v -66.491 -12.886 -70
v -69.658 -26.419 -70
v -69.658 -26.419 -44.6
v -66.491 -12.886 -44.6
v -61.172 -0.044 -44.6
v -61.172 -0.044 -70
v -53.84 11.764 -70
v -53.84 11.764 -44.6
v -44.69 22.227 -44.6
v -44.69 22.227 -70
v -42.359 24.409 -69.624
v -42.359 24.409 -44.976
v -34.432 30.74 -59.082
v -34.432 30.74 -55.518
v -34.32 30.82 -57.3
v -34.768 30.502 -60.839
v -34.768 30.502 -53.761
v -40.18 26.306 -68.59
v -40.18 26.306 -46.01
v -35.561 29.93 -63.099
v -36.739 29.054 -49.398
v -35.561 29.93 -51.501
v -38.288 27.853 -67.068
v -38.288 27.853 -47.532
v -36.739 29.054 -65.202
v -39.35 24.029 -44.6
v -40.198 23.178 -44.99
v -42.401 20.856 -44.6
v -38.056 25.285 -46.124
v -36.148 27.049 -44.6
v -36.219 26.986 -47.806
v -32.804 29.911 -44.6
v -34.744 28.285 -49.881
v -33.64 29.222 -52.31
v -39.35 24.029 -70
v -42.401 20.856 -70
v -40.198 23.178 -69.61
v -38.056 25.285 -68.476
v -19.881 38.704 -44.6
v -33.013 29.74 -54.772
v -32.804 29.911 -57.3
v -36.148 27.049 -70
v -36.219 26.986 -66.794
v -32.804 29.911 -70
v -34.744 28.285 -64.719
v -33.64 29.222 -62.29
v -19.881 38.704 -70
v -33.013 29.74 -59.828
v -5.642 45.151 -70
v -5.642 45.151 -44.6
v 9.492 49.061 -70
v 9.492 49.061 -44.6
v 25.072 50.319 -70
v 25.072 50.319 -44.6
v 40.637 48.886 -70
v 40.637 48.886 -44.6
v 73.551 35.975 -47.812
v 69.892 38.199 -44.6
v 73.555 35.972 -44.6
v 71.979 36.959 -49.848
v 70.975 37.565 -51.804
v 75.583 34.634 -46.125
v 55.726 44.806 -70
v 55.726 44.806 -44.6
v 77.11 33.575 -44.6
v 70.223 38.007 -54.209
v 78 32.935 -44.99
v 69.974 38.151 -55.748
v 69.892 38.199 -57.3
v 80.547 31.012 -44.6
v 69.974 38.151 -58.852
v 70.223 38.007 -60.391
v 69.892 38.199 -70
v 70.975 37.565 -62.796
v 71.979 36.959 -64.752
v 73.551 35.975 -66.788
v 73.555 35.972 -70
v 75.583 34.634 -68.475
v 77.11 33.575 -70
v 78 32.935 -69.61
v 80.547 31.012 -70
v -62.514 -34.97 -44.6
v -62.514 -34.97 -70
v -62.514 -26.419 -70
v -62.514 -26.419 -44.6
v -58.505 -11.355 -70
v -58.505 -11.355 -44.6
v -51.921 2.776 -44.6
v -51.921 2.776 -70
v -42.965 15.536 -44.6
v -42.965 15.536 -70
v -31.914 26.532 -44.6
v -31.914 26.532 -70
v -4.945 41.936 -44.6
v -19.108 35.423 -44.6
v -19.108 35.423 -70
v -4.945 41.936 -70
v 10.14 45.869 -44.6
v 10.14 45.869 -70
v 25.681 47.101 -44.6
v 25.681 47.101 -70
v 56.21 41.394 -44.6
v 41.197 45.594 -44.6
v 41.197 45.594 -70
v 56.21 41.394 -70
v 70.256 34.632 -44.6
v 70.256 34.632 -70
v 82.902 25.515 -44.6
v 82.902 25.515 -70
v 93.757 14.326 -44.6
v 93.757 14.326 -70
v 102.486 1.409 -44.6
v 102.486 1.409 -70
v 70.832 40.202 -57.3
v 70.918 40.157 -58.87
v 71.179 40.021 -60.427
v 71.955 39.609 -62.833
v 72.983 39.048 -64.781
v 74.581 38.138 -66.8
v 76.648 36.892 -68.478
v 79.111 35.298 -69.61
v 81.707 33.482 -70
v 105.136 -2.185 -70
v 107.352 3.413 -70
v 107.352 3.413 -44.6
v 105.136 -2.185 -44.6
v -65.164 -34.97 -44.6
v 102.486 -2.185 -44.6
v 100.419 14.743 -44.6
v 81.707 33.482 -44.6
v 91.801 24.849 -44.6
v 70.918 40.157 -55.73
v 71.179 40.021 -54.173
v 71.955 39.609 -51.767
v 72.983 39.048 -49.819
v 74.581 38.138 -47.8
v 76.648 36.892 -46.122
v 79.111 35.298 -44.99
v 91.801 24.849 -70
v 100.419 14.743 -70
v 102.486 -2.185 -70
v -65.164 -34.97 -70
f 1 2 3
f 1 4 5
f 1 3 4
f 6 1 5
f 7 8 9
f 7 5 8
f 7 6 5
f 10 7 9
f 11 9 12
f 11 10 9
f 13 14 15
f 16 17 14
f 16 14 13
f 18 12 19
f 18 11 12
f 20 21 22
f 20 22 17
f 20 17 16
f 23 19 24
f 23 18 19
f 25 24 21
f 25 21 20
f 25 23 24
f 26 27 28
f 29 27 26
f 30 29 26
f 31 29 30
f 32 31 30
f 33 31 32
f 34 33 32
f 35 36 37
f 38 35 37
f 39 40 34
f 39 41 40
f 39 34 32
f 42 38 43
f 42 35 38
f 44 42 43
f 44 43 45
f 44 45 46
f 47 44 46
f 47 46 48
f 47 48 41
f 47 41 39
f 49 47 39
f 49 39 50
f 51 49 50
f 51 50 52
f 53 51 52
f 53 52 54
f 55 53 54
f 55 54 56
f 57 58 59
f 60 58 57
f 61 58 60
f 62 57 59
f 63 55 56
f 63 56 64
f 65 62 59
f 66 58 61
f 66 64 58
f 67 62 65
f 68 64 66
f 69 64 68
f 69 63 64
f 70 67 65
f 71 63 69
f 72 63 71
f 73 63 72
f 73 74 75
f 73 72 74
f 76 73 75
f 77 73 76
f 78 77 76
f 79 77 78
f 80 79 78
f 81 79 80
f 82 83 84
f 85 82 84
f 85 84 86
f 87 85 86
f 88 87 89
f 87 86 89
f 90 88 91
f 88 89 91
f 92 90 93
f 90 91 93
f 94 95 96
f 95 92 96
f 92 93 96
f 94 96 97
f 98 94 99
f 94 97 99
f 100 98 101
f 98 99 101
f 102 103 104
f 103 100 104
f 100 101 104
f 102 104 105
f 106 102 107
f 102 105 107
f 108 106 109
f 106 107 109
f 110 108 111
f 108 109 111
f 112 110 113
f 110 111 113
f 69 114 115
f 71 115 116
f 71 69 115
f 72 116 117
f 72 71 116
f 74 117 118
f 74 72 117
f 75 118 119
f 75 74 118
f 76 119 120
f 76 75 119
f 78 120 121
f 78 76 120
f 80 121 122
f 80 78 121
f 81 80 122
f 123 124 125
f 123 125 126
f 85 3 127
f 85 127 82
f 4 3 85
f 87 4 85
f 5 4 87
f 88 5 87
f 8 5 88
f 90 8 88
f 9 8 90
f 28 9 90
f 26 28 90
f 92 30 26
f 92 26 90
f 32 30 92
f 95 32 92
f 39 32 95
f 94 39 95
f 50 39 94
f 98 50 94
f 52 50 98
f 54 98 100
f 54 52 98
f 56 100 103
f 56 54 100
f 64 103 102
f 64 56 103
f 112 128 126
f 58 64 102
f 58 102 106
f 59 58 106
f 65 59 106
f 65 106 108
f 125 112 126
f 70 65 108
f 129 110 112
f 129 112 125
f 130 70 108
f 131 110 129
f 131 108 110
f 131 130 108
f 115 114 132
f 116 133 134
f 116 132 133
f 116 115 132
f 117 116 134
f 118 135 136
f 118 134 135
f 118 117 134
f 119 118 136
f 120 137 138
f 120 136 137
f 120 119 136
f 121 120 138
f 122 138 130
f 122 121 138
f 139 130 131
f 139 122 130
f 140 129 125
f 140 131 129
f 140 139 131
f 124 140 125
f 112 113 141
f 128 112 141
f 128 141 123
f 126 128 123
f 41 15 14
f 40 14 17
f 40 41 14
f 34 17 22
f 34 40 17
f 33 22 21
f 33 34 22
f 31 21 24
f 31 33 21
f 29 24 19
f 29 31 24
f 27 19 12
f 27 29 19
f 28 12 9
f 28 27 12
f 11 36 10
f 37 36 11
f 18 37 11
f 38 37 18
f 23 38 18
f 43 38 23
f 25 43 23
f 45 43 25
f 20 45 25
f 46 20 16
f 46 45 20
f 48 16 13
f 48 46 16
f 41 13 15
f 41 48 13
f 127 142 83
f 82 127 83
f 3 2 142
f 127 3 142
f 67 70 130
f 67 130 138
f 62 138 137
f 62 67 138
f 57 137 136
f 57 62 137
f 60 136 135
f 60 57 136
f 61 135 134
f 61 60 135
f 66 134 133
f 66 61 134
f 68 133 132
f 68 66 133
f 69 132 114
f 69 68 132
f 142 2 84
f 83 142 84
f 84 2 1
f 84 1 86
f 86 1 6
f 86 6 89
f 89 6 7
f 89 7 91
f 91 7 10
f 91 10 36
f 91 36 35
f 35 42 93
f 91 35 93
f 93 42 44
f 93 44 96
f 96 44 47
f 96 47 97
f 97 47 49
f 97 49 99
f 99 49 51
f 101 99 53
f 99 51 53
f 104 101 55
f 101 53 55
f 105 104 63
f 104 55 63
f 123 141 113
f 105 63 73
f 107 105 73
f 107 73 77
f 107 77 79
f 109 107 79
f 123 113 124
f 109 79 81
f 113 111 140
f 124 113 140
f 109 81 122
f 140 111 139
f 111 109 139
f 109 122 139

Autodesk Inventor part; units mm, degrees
ref_plane "YZ Plane" through (0, 0, 0) normal (1, 0, 0) x (0, 1, 0)
ref_plane "XZ Plane" through (0, 0, 0) normal (0, 1, 0) x (-1, 0, 0)
ref_plane "Work Plane1" through (0, 0, -70) normal (0, 0, 1) x (1, 0, 0)
sketch "Sketch1" plane through (0, 0, -70) normal (0, 0, 1) x (1, 0, 0)
  line L0 (105.135585, -0.094334) -> (105.135585, -23.278359)
  line L1 (-62.514415, -50.241251) -> (-62.514415, -27.759659)
  line L2 (-62.514415, -26.419466) -> (-62.514415, -51.782245)
  line L3 (102.485585, -0.094334) -> (102.485585, -23.278359)
  line L4 (102.485585, 1.408956) -> (105.135585, 1.408956)
  line L5 (-62.514415, -26.419466) -> (-62.514415, -51.782245)
  line L6 (-65.164415, -50.241251) -> (-65.164415, -27.759659)
  line L7 (-62.514415, -26.419466) -> (-65.164415, -26.419466)
  arc A0 (105.135585, 1.408956) -> (-65.164415, -26.419466) centre (24.560741, -40.503573) ccw
  line L8 (-65.164415, -26.419466) -> (-67.161965, -26.419466)
  arc A1 (102.485585, 1.408956) -> (-62.514415, -26.419466) centre (24.895442, -41.61673) ccw
  line L9 (-65.164415, -26.419466) -> (-69.658457, -26.419466)
  arc A2 (-34.319919, 30.819568) -> (-69.658457, -26.419466) centre (14.828678, -39.052317) ccw
  line L10 (-34.319919, 30.819568) -> (-32.803901, 29.911365)
  line L11 (105.135585, 1.408956) -> (107.351745, 3.413316)
  arc A3 (107.351745, 3.413316) -> (70.831931, 40.201852) centre (31.896127, -34.970341) ccw
  line L12 (70.831931, 40.201852) -> (69.891547, 38.198928)
  line L13 (102.485585, 1.408956) -> (102.485585, -2.185128)
  line L14 (102.485585, -2.185128) -> (105.135585, -2.185128)
  line L15 (107.351745, 3.413316) -> (105.135585, -2.185128)
  line L16 (-69.658457, -26.419466) -> (-65.164415, -34.970341)
  line L17 (-65.164415, -34.970341) -> (-62.514415, -34.970341)
  line L18 (-62.514415, -34.970341) -> (-62.514415, -26.419466)
  point P0 (0, 0)
  point P1 (-31.670702, 30.819568)
extrude "Extrusion1" add sketch "Sketch1" along normal blind 25.4
fillet "Fillet1" radius 12.7 4 edges at (-33.5619, 30.3655, -70) (-33.5619, 30.3655, -44.6) (70.3617, 39.2004, -70) (70.3617, 39.2004, -44.6)
properties part number "thigh_strap_01" material "Acetal Resin, Black"
